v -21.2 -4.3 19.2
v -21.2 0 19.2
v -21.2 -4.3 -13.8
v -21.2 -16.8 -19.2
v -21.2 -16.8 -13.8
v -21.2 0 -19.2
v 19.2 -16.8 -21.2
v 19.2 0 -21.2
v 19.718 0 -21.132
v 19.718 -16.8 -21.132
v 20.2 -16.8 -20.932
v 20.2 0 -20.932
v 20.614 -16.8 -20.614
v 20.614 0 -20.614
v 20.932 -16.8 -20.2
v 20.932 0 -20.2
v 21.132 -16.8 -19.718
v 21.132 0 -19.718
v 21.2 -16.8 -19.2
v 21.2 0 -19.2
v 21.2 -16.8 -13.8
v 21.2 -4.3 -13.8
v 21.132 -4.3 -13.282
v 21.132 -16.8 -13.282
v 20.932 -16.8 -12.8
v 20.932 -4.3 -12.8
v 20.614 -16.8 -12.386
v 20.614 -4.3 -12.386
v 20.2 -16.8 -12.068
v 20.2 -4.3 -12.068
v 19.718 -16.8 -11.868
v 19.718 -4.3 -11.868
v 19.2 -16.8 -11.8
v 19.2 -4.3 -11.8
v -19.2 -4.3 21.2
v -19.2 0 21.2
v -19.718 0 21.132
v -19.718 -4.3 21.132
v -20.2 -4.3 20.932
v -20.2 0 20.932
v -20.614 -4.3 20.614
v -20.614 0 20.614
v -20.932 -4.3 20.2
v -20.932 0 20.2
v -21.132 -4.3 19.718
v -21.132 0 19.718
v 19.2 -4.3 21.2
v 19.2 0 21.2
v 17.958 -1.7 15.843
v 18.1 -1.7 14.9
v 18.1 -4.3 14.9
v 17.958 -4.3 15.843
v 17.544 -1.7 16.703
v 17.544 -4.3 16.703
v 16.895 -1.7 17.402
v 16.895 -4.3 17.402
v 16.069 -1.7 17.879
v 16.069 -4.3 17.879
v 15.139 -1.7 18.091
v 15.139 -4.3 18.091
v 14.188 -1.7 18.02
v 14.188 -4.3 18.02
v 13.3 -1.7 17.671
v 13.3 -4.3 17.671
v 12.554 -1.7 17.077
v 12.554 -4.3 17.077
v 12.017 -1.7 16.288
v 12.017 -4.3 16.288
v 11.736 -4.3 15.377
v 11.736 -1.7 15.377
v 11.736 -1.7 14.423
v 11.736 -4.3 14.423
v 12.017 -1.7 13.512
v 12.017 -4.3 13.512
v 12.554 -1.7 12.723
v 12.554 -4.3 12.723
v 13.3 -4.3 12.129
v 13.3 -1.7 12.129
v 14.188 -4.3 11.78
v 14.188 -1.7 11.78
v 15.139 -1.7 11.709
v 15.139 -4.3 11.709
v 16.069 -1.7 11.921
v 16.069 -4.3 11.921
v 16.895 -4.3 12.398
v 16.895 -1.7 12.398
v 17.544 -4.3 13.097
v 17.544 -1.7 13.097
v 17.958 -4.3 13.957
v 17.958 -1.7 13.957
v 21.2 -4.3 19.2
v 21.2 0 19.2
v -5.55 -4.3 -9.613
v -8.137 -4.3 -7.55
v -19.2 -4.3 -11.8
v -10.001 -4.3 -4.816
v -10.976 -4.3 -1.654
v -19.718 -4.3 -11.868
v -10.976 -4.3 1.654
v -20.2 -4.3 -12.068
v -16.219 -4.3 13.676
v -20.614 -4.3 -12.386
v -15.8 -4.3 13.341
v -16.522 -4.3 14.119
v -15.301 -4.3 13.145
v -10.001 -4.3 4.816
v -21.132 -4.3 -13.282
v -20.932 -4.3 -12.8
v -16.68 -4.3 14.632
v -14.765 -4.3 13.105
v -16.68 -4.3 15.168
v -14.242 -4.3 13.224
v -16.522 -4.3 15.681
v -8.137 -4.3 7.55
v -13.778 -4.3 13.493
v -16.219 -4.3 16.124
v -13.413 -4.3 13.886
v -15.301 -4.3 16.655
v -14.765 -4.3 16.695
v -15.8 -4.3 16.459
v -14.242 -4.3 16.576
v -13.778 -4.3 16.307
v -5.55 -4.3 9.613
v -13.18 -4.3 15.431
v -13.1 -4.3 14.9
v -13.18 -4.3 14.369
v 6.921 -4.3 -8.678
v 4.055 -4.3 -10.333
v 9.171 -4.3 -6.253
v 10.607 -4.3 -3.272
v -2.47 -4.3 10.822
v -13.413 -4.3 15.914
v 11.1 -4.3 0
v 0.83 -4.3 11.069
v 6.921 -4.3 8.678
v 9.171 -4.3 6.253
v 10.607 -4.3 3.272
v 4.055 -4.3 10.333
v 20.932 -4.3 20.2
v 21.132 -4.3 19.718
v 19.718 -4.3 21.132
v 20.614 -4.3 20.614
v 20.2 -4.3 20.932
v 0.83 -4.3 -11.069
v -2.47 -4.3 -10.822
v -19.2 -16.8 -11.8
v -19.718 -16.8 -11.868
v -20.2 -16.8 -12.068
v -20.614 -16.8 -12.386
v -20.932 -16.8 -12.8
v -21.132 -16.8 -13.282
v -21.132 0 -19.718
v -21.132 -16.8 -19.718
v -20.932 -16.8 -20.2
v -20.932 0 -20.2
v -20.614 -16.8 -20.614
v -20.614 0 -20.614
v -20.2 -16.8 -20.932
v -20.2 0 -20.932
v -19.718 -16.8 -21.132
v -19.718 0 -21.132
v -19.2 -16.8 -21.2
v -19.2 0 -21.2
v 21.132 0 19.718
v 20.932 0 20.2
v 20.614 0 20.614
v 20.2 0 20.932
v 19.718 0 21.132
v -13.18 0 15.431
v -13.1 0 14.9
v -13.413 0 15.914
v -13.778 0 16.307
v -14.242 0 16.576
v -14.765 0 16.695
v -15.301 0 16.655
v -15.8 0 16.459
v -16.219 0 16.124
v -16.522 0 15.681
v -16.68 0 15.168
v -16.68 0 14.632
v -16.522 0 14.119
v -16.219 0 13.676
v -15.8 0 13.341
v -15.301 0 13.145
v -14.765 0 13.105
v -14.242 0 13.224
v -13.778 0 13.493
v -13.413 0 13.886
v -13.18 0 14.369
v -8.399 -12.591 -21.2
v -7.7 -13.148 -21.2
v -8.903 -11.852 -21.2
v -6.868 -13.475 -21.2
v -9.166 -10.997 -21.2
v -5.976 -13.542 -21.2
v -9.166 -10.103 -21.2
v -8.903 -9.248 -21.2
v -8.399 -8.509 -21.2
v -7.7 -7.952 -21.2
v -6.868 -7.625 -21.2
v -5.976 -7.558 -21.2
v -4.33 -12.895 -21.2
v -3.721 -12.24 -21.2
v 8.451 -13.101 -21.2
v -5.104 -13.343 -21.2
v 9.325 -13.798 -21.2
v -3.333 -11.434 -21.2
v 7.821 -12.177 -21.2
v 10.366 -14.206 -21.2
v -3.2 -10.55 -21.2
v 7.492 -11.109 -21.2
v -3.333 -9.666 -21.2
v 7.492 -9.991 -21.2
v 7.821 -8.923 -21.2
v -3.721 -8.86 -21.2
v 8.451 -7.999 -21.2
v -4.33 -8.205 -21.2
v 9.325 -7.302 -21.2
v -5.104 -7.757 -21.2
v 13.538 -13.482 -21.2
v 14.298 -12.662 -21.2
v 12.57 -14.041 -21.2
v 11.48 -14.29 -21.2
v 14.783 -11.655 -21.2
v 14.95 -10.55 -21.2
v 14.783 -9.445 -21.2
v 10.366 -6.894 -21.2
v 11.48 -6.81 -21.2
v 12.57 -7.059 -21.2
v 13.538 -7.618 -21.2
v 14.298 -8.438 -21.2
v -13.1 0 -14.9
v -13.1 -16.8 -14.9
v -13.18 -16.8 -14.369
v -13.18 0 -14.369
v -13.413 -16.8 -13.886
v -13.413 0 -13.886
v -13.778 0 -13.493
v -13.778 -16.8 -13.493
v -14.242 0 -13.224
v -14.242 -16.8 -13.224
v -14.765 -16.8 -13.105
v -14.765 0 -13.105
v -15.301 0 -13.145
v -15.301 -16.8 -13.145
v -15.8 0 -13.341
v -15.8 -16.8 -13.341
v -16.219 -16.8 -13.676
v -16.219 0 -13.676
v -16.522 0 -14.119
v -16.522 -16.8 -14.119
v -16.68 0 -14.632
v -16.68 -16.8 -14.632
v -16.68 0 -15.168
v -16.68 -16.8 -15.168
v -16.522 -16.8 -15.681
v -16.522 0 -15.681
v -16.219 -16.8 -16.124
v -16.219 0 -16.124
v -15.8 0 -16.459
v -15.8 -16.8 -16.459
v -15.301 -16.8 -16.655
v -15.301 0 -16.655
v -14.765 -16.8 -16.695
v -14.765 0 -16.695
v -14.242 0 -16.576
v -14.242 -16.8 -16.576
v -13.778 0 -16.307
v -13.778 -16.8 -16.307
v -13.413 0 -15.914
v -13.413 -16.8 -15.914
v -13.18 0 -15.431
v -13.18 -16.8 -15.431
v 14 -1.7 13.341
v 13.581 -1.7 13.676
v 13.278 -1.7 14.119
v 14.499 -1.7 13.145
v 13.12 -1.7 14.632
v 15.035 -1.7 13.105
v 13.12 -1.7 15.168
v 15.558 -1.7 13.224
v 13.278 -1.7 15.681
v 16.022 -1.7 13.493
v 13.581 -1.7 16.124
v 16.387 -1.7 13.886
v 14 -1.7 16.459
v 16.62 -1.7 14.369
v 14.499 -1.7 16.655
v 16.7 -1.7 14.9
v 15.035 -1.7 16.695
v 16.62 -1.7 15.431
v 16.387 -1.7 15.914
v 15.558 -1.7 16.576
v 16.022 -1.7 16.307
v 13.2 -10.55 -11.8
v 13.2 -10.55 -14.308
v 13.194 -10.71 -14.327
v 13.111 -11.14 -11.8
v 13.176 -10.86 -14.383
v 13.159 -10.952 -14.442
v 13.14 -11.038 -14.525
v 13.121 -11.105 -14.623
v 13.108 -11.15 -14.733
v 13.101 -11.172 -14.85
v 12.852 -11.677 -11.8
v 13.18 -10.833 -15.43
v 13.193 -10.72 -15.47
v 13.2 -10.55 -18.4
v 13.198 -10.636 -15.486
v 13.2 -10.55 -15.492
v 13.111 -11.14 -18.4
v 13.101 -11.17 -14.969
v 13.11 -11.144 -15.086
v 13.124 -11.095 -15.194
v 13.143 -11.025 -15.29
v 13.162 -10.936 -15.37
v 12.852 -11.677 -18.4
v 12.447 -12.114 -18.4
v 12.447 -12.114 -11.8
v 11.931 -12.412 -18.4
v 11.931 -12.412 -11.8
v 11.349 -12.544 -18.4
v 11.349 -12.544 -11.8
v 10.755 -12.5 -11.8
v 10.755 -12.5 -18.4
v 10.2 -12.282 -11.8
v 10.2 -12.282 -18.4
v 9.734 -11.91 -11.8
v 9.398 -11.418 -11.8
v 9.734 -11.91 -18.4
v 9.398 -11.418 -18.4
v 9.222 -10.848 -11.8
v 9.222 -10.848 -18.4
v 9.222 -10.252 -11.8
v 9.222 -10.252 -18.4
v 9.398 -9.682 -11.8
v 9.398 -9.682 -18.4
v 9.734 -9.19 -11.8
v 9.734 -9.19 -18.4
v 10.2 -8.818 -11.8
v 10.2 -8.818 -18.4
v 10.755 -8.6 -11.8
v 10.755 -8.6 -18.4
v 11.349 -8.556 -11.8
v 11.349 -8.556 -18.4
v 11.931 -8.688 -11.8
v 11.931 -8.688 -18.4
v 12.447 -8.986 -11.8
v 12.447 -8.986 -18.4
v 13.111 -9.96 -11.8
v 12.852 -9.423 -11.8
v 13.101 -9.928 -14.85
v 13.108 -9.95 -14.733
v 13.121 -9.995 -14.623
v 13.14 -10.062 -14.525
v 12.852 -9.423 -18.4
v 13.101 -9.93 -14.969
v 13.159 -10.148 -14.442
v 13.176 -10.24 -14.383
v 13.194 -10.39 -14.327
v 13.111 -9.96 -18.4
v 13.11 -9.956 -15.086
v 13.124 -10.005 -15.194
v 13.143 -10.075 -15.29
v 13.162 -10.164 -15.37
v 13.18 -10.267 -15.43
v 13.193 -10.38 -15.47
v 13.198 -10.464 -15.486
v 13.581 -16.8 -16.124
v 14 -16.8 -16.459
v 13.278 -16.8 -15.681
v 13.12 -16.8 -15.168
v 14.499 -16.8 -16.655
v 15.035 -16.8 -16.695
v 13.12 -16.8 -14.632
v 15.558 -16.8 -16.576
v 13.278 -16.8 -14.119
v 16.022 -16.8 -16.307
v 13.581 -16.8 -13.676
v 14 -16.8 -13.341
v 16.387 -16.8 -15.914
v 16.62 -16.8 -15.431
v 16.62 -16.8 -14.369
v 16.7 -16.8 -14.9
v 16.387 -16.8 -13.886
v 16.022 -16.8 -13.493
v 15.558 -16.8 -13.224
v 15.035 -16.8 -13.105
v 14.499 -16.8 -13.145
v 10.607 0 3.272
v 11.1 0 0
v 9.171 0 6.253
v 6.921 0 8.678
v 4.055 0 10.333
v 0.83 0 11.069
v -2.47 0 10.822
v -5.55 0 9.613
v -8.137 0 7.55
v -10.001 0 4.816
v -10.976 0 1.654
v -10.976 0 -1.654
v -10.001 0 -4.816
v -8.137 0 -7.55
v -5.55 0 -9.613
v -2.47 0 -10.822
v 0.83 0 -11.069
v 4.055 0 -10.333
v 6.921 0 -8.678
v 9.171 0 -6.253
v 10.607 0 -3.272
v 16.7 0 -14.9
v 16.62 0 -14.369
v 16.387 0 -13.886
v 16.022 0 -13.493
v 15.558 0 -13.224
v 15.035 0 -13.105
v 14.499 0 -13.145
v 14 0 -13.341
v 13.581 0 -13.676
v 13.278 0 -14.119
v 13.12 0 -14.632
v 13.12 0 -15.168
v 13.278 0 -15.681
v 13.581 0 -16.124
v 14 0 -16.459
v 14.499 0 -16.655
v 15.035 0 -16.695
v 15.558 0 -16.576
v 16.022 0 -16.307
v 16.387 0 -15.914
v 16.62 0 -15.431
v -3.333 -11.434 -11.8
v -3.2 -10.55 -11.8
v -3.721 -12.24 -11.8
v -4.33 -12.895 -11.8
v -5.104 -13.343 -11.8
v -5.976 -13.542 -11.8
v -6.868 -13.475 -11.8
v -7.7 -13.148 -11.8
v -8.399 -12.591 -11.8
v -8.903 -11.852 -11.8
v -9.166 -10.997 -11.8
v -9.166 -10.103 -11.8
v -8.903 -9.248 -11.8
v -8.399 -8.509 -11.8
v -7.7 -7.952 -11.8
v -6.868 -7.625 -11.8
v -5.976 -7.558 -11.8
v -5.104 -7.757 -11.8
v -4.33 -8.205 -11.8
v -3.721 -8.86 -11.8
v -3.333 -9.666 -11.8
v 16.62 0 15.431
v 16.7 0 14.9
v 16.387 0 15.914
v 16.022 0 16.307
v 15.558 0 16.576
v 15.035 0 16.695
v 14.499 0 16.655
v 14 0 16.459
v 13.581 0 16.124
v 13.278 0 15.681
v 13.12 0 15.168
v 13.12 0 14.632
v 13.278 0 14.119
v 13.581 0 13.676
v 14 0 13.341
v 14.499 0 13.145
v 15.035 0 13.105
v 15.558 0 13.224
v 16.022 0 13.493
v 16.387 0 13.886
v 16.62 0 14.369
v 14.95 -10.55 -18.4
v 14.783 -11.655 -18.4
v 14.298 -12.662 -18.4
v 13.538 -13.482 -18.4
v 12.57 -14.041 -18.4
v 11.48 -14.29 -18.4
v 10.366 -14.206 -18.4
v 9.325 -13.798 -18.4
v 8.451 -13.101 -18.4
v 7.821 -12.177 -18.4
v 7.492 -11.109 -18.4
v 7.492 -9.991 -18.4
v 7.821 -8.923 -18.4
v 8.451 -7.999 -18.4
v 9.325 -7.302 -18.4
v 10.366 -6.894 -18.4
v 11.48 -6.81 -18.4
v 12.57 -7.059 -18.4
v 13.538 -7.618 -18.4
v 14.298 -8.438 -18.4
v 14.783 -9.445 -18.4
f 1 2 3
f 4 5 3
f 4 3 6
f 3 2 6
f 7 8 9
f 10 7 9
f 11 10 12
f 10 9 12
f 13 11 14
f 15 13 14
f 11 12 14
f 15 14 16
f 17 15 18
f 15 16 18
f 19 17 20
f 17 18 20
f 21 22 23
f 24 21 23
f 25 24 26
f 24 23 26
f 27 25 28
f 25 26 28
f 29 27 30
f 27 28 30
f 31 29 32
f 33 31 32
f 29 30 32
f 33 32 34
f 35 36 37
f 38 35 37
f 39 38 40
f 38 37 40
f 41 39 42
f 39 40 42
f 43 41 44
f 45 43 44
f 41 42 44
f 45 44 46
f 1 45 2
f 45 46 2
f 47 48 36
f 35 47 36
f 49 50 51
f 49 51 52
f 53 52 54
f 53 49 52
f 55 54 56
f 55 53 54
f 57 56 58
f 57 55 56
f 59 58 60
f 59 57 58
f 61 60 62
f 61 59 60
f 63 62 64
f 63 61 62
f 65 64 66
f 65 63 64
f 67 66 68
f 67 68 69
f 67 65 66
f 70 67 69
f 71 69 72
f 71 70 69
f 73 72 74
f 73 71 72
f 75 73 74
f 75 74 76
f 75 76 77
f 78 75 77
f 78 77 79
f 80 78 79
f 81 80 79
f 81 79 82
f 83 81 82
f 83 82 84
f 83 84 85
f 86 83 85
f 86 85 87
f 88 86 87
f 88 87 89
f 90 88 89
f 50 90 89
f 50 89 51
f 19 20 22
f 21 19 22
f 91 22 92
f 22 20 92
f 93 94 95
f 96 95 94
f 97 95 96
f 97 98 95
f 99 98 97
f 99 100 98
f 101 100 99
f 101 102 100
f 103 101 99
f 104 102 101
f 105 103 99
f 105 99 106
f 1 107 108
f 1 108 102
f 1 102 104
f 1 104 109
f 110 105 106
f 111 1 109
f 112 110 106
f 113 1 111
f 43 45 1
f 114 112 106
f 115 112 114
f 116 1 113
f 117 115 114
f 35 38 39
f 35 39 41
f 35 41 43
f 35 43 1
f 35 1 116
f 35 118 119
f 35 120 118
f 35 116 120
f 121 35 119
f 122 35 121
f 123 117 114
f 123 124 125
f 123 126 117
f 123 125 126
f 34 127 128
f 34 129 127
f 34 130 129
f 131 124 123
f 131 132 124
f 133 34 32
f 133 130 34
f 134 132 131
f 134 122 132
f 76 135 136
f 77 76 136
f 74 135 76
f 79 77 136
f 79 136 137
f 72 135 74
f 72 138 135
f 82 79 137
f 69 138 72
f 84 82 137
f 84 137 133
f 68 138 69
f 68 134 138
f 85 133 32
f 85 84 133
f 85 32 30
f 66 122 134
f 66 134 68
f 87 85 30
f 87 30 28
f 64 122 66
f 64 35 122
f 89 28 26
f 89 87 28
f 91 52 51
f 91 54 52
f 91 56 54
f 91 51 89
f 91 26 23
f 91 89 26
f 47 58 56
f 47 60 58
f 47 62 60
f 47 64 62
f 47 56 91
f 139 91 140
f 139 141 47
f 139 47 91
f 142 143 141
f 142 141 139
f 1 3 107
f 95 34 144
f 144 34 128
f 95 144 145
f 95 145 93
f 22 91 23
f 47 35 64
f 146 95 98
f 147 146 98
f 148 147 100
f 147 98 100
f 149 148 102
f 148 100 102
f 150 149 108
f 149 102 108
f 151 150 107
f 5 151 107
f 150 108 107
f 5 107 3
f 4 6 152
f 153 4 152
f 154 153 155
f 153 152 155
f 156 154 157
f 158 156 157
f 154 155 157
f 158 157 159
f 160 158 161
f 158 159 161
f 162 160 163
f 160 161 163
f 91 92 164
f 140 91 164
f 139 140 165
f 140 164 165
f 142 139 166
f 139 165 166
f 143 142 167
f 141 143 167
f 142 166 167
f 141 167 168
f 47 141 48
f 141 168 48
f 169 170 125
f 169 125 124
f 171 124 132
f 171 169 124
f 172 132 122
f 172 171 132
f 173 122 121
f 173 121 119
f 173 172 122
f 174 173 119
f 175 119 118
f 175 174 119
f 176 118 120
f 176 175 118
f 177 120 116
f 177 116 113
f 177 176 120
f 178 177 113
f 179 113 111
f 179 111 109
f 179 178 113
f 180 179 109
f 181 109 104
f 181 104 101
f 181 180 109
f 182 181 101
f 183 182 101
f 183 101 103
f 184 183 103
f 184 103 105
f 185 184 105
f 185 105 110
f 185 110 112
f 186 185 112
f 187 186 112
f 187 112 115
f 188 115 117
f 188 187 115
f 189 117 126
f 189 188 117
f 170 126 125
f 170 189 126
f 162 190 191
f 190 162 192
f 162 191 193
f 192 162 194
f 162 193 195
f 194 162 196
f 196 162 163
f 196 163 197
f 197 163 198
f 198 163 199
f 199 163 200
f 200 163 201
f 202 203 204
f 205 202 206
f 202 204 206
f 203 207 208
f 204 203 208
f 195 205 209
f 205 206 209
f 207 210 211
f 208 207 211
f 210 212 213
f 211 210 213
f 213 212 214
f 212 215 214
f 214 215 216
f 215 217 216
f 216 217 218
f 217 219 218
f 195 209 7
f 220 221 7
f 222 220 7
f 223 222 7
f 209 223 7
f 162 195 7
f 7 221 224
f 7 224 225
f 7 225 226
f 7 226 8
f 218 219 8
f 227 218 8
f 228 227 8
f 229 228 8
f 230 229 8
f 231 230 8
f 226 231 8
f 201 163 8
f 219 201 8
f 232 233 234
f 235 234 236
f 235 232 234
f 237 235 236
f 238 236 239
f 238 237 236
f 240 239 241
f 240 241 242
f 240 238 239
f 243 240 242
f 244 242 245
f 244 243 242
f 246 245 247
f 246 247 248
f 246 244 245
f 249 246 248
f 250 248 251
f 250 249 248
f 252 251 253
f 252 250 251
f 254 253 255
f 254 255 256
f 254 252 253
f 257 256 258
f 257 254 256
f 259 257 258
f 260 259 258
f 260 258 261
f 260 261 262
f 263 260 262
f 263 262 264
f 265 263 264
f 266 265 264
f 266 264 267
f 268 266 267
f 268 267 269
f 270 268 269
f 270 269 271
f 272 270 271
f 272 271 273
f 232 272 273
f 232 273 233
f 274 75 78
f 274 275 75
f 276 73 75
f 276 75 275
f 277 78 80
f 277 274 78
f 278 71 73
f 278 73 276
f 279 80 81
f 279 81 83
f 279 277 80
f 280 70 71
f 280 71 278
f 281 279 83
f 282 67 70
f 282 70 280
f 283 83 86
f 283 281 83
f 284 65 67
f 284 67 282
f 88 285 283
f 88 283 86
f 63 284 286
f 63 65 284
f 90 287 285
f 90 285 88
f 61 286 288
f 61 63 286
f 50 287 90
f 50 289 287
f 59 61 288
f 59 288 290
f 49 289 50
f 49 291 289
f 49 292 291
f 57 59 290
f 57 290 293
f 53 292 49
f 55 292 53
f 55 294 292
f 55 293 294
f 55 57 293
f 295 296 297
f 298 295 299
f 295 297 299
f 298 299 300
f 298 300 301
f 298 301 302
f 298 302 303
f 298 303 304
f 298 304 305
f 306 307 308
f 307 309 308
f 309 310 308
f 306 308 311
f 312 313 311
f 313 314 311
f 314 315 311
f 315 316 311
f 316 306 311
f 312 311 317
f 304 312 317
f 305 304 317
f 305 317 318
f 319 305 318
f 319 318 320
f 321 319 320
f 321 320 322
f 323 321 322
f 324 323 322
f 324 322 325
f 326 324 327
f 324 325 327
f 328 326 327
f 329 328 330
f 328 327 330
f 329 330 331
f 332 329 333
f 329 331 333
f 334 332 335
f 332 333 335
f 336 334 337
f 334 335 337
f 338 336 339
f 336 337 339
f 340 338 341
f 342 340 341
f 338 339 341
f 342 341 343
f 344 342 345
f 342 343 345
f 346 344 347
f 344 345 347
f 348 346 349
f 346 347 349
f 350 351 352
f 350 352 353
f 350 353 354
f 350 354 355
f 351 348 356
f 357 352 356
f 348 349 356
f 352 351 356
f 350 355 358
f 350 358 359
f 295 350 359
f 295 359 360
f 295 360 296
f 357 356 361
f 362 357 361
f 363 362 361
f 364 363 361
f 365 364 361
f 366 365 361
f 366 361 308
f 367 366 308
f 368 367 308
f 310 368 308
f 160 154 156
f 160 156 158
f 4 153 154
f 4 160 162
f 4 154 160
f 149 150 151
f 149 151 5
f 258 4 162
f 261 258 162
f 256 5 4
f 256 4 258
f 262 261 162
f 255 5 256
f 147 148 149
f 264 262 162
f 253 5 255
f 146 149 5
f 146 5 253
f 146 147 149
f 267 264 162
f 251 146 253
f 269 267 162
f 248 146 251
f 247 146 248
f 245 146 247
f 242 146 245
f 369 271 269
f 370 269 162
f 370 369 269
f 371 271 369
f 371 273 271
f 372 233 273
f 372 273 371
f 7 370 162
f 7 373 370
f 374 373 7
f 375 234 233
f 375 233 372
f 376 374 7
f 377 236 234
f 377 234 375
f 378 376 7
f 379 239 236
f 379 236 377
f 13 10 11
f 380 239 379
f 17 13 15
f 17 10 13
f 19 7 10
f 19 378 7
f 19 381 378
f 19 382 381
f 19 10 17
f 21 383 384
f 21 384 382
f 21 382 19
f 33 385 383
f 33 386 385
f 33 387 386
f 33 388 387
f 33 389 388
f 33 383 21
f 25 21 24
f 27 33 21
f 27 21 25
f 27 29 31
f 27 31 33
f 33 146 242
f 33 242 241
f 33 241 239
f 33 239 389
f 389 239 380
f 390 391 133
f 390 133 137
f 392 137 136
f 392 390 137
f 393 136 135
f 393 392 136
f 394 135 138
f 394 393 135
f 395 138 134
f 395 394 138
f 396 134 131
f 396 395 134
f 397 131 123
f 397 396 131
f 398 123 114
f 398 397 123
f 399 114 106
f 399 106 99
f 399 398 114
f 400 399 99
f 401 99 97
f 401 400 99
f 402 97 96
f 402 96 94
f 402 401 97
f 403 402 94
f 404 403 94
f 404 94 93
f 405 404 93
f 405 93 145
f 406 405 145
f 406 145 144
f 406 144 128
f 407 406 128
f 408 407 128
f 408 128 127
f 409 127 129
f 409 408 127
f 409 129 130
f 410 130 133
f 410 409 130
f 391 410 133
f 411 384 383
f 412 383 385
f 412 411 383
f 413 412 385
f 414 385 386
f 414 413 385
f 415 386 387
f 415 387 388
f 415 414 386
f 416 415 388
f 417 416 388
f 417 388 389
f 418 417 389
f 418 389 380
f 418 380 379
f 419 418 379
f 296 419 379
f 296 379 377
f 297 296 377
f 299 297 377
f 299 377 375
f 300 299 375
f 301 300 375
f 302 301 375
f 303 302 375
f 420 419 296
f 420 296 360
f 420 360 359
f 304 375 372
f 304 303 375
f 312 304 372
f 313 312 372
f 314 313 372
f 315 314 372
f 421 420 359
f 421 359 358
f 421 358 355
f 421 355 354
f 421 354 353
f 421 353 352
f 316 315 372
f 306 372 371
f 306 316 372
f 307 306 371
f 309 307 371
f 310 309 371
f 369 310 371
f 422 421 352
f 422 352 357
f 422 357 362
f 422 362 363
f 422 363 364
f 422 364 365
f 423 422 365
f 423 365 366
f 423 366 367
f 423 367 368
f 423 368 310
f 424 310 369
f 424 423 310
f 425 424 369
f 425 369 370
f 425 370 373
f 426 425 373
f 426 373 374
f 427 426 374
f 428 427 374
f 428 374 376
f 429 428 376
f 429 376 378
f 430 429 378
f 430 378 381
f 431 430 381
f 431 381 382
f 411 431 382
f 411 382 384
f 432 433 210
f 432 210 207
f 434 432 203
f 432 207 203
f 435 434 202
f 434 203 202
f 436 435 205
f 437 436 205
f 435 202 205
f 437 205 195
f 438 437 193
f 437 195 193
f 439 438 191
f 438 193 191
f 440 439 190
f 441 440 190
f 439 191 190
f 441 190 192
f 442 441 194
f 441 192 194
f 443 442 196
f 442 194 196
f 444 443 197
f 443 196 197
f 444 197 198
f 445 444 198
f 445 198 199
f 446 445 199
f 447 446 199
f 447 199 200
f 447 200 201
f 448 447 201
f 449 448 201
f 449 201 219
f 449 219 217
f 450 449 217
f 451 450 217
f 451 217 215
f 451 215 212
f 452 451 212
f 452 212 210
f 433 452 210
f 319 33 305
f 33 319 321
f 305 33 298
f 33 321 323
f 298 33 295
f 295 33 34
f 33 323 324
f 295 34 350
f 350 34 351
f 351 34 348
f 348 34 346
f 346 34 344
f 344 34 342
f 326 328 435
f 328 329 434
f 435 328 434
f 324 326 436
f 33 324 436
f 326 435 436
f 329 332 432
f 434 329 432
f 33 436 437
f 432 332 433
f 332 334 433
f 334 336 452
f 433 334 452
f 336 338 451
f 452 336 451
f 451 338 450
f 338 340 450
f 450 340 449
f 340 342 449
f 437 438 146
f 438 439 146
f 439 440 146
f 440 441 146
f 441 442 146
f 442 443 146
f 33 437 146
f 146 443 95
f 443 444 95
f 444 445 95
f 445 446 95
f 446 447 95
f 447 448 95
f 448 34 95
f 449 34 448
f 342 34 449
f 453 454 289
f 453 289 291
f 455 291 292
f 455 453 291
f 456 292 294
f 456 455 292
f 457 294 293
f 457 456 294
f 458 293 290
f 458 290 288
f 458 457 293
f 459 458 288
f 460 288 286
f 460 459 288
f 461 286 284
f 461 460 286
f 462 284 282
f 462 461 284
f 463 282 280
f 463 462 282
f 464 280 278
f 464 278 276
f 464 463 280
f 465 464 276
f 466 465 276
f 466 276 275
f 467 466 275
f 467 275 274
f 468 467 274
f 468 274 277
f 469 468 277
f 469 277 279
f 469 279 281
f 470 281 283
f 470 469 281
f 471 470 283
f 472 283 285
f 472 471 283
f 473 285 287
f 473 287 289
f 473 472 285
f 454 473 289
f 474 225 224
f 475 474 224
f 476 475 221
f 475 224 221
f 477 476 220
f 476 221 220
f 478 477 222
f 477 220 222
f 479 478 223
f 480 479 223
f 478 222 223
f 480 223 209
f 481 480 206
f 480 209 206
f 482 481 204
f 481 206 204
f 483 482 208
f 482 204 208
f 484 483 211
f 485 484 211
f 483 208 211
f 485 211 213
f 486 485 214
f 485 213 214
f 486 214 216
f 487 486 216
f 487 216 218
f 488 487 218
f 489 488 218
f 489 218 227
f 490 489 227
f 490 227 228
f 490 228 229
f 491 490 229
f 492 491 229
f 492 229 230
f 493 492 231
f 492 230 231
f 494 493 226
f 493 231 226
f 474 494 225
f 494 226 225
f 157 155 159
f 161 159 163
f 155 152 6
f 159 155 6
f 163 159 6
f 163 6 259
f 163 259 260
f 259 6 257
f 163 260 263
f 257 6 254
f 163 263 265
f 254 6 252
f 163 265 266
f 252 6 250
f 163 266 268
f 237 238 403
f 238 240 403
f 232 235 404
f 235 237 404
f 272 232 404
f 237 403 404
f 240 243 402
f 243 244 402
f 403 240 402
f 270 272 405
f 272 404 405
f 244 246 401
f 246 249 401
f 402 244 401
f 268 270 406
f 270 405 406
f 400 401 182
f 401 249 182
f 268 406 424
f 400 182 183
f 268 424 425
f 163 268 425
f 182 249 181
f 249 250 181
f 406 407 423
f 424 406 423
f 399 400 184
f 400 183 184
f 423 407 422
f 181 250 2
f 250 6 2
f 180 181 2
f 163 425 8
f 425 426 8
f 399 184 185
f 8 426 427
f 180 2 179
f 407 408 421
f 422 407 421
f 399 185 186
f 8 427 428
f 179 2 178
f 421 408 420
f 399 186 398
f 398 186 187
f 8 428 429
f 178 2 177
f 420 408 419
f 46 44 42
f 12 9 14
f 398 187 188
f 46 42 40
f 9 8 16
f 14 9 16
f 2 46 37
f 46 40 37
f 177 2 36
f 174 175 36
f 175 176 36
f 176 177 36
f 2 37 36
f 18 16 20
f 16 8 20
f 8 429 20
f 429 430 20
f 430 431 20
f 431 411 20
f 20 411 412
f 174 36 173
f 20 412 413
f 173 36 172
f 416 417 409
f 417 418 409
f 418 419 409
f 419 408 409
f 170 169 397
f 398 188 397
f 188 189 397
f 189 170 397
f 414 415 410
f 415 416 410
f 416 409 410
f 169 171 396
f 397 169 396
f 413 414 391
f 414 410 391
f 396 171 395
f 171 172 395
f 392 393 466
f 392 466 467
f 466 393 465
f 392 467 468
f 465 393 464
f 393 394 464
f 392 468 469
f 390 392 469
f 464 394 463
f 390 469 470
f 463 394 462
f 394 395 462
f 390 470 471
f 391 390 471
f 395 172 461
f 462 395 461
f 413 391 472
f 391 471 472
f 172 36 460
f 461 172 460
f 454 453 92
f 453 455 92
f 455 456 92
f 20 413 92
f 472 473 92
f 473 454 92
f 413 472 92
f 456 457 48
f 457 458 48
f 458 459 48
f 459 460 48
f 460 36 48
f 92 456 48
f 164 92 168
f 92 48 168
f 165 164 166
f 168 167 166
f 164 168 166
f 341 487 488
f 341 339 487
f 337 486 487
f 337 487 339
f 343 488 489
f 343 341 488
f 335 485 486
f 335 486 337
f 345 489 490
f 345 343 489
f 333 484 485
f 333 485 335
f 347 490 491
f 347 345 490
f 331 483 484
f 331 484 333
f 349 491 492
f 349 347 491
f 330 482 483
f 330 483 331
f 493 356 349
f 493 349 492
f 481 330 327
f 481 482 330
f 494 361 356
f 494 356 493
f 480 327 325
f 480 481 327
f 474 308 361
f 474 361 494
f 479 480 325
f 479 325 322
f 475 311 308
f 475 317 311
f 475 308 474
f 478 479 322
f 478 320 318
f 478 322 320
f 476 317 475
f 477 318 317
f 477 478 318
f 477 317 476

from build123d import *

# Parameters (mm, degrees)
F0_R     = 1.8
F0_R_2   = 11.1
F0_R_3   = 3.2
F2_DEPTH = 4.3
F3_DEPTH = 1.7
F4_DEPTH = 16.8
F5_R     = 3
F5_R_2   = 2
F6_DEPTH = 42.401
F5_R_3   = 3.75
F7_DEPTH = 2.8


with BuildPart() as f2:
    # F0 (on Front) → F2 (new body, through all)
    with BuildSketch(Plane.XZ):
        with BuildLine():
            ThreePointArc((-19.2, -11.8), (-20.614214, -12.385786), (-21.2, -13.8))
            Line((-21.2, -13.8), (-21.2, -19.2))
            ThreePointArc((-21.2, -19.2), (-20.614214, -20.614214), (-19.2, -21.2))
            Line((-19.2, -21.2), (19.2, -21.2))
            ThreePointArc((19.2, -21.2), (20.614214, -20.614214), (21.2, -19.2))
            Line((21.2, -19.2), (21.2, -13.8))
            ThreePointArc((21.2, -13.8), (20.614214, -12.385786), (19.2, -11.8))
            Line((19.2, -11.8), (-19.2, -11.8))
        make_face()
        with Locations((-14.9, -14.9)):
            Circle(F0_R, mode=Mode.SUBTRACT)
        with Locations((14.9, -14.9)):
            Circle(F0_R, mode=Mode.SUBTRACT)
        with BuildLine():
            Line((19.2, 21.2), (-19.2, 21.2))
            ThreePointArc((-19.2, 21.2), (-20.614214, 20.614214), (-21.2, 19.2))
            Line((-21.2, 19.2), (-21.2, -13.8))
            ThreePointArc((-21.2, -13.8), (-20.614214, -12.385786), (-19.2, -11.8))
            Line((-19.2, -11.8), (19.2, -11.8))
            ThreePointArc((19.2, -11.8), (20.614214, -12.385786), (21.2, -13.8))
            Line((21.2, -13.8), (21.2, 19.2))
            ThreePointArc((21.2, 19.2), (20.614214, 20.614214), (19.2, 21.2))
        make_face()
        with Locations((-14.9, 14.9)):
            Circle(F0_R, mode=Mode.SUBTRACT)
        Circle(F0_R_2, mode=Mode.SUBTRACT)
        with Locations((14.9, 14.9)):
            Circle(F0_R_3, mode=Mode.SUBTRACT)
    extrude(amount=F2_DEPTH)

    # F0 (on Front) → F3 (join, through all)
    with BuildSketch(Plane.XZ):
        with Locations((14.9, 14.9)):
            Circle(F0_R_3)
        with Locations((14.9, 14.9)):
            Circle(F0_R, mode=Mode.SUBTRACT)
    extrude(amount=F3_DEPTH)

    # F0 (on Front) → F4 (join, through all)
    with BuildSketch(Plane.XZ):
        with BuildLine():
            ThreePointArc((-19.2, -11.8), (-20.614214, -12.385786), (-21.2, -13.8))
            Line((-21.2, -13.8), (-21.2, -19.2))
            ThreePointArc((-21.2, -19.2), (-20.614214, -20.614214), (-19.2, -21.2))
            Line((-19.2, -21.2), (19.2, -21.2))
            ThreePointArc((19.2, -21.2), (20.614214, -20.614214), (21.2, -19.2))
            Line((21.2, -19.2), (21.2, -13.8))
            ThreePointArc((21.2, -13.8), (20.614214, -12.385786), (19.2, -11.8))
            Line((19.2, -11.8), (-19.2, -11.8))
        make_face()
        with Locations((-14.9, -14.9)):
            Circle(F0_R, mode=Mode.SUBTRACT)
        with Locations((14.9, -14.9)):
            Circle(F0_R, mode=Mode.SUBTRACT)
    extrude(amount=F4_DEPTH)

    # F5 (on face) → F6 (cut, through all)
    with BuildSketch(Plane(origin=(0, 0, -21.2), x_dir=(1, 0, 0), z_dir=(0, 0, -1))):
        with Locations((-6.2, 10.55)):
            Circle(F5_R)
        with Locations((11.2, 10.55)):
            Circle(F5_R_2)
    extrude(amount=-F6_DEPTH, mode=Mode.SUBTRACT)

    # F5 (on face) → F7 (cut, through all)
    with BuildSketch(Plane(origin=(0, 0, -21.2), x_dir=(1, 0, 0), z_dir=(0, 0, -1))):
        with Locations((11.2, 10.55)):
            Circle(F5_R_3)
        with Locations((11.2, 10.55)):
            Circle(F5_R_2, mode=Mode.SUBTRACT)
    extrude(amount=-F7_DEPTH, mode=Mode.SUBTRACT)


solid = f2.part
